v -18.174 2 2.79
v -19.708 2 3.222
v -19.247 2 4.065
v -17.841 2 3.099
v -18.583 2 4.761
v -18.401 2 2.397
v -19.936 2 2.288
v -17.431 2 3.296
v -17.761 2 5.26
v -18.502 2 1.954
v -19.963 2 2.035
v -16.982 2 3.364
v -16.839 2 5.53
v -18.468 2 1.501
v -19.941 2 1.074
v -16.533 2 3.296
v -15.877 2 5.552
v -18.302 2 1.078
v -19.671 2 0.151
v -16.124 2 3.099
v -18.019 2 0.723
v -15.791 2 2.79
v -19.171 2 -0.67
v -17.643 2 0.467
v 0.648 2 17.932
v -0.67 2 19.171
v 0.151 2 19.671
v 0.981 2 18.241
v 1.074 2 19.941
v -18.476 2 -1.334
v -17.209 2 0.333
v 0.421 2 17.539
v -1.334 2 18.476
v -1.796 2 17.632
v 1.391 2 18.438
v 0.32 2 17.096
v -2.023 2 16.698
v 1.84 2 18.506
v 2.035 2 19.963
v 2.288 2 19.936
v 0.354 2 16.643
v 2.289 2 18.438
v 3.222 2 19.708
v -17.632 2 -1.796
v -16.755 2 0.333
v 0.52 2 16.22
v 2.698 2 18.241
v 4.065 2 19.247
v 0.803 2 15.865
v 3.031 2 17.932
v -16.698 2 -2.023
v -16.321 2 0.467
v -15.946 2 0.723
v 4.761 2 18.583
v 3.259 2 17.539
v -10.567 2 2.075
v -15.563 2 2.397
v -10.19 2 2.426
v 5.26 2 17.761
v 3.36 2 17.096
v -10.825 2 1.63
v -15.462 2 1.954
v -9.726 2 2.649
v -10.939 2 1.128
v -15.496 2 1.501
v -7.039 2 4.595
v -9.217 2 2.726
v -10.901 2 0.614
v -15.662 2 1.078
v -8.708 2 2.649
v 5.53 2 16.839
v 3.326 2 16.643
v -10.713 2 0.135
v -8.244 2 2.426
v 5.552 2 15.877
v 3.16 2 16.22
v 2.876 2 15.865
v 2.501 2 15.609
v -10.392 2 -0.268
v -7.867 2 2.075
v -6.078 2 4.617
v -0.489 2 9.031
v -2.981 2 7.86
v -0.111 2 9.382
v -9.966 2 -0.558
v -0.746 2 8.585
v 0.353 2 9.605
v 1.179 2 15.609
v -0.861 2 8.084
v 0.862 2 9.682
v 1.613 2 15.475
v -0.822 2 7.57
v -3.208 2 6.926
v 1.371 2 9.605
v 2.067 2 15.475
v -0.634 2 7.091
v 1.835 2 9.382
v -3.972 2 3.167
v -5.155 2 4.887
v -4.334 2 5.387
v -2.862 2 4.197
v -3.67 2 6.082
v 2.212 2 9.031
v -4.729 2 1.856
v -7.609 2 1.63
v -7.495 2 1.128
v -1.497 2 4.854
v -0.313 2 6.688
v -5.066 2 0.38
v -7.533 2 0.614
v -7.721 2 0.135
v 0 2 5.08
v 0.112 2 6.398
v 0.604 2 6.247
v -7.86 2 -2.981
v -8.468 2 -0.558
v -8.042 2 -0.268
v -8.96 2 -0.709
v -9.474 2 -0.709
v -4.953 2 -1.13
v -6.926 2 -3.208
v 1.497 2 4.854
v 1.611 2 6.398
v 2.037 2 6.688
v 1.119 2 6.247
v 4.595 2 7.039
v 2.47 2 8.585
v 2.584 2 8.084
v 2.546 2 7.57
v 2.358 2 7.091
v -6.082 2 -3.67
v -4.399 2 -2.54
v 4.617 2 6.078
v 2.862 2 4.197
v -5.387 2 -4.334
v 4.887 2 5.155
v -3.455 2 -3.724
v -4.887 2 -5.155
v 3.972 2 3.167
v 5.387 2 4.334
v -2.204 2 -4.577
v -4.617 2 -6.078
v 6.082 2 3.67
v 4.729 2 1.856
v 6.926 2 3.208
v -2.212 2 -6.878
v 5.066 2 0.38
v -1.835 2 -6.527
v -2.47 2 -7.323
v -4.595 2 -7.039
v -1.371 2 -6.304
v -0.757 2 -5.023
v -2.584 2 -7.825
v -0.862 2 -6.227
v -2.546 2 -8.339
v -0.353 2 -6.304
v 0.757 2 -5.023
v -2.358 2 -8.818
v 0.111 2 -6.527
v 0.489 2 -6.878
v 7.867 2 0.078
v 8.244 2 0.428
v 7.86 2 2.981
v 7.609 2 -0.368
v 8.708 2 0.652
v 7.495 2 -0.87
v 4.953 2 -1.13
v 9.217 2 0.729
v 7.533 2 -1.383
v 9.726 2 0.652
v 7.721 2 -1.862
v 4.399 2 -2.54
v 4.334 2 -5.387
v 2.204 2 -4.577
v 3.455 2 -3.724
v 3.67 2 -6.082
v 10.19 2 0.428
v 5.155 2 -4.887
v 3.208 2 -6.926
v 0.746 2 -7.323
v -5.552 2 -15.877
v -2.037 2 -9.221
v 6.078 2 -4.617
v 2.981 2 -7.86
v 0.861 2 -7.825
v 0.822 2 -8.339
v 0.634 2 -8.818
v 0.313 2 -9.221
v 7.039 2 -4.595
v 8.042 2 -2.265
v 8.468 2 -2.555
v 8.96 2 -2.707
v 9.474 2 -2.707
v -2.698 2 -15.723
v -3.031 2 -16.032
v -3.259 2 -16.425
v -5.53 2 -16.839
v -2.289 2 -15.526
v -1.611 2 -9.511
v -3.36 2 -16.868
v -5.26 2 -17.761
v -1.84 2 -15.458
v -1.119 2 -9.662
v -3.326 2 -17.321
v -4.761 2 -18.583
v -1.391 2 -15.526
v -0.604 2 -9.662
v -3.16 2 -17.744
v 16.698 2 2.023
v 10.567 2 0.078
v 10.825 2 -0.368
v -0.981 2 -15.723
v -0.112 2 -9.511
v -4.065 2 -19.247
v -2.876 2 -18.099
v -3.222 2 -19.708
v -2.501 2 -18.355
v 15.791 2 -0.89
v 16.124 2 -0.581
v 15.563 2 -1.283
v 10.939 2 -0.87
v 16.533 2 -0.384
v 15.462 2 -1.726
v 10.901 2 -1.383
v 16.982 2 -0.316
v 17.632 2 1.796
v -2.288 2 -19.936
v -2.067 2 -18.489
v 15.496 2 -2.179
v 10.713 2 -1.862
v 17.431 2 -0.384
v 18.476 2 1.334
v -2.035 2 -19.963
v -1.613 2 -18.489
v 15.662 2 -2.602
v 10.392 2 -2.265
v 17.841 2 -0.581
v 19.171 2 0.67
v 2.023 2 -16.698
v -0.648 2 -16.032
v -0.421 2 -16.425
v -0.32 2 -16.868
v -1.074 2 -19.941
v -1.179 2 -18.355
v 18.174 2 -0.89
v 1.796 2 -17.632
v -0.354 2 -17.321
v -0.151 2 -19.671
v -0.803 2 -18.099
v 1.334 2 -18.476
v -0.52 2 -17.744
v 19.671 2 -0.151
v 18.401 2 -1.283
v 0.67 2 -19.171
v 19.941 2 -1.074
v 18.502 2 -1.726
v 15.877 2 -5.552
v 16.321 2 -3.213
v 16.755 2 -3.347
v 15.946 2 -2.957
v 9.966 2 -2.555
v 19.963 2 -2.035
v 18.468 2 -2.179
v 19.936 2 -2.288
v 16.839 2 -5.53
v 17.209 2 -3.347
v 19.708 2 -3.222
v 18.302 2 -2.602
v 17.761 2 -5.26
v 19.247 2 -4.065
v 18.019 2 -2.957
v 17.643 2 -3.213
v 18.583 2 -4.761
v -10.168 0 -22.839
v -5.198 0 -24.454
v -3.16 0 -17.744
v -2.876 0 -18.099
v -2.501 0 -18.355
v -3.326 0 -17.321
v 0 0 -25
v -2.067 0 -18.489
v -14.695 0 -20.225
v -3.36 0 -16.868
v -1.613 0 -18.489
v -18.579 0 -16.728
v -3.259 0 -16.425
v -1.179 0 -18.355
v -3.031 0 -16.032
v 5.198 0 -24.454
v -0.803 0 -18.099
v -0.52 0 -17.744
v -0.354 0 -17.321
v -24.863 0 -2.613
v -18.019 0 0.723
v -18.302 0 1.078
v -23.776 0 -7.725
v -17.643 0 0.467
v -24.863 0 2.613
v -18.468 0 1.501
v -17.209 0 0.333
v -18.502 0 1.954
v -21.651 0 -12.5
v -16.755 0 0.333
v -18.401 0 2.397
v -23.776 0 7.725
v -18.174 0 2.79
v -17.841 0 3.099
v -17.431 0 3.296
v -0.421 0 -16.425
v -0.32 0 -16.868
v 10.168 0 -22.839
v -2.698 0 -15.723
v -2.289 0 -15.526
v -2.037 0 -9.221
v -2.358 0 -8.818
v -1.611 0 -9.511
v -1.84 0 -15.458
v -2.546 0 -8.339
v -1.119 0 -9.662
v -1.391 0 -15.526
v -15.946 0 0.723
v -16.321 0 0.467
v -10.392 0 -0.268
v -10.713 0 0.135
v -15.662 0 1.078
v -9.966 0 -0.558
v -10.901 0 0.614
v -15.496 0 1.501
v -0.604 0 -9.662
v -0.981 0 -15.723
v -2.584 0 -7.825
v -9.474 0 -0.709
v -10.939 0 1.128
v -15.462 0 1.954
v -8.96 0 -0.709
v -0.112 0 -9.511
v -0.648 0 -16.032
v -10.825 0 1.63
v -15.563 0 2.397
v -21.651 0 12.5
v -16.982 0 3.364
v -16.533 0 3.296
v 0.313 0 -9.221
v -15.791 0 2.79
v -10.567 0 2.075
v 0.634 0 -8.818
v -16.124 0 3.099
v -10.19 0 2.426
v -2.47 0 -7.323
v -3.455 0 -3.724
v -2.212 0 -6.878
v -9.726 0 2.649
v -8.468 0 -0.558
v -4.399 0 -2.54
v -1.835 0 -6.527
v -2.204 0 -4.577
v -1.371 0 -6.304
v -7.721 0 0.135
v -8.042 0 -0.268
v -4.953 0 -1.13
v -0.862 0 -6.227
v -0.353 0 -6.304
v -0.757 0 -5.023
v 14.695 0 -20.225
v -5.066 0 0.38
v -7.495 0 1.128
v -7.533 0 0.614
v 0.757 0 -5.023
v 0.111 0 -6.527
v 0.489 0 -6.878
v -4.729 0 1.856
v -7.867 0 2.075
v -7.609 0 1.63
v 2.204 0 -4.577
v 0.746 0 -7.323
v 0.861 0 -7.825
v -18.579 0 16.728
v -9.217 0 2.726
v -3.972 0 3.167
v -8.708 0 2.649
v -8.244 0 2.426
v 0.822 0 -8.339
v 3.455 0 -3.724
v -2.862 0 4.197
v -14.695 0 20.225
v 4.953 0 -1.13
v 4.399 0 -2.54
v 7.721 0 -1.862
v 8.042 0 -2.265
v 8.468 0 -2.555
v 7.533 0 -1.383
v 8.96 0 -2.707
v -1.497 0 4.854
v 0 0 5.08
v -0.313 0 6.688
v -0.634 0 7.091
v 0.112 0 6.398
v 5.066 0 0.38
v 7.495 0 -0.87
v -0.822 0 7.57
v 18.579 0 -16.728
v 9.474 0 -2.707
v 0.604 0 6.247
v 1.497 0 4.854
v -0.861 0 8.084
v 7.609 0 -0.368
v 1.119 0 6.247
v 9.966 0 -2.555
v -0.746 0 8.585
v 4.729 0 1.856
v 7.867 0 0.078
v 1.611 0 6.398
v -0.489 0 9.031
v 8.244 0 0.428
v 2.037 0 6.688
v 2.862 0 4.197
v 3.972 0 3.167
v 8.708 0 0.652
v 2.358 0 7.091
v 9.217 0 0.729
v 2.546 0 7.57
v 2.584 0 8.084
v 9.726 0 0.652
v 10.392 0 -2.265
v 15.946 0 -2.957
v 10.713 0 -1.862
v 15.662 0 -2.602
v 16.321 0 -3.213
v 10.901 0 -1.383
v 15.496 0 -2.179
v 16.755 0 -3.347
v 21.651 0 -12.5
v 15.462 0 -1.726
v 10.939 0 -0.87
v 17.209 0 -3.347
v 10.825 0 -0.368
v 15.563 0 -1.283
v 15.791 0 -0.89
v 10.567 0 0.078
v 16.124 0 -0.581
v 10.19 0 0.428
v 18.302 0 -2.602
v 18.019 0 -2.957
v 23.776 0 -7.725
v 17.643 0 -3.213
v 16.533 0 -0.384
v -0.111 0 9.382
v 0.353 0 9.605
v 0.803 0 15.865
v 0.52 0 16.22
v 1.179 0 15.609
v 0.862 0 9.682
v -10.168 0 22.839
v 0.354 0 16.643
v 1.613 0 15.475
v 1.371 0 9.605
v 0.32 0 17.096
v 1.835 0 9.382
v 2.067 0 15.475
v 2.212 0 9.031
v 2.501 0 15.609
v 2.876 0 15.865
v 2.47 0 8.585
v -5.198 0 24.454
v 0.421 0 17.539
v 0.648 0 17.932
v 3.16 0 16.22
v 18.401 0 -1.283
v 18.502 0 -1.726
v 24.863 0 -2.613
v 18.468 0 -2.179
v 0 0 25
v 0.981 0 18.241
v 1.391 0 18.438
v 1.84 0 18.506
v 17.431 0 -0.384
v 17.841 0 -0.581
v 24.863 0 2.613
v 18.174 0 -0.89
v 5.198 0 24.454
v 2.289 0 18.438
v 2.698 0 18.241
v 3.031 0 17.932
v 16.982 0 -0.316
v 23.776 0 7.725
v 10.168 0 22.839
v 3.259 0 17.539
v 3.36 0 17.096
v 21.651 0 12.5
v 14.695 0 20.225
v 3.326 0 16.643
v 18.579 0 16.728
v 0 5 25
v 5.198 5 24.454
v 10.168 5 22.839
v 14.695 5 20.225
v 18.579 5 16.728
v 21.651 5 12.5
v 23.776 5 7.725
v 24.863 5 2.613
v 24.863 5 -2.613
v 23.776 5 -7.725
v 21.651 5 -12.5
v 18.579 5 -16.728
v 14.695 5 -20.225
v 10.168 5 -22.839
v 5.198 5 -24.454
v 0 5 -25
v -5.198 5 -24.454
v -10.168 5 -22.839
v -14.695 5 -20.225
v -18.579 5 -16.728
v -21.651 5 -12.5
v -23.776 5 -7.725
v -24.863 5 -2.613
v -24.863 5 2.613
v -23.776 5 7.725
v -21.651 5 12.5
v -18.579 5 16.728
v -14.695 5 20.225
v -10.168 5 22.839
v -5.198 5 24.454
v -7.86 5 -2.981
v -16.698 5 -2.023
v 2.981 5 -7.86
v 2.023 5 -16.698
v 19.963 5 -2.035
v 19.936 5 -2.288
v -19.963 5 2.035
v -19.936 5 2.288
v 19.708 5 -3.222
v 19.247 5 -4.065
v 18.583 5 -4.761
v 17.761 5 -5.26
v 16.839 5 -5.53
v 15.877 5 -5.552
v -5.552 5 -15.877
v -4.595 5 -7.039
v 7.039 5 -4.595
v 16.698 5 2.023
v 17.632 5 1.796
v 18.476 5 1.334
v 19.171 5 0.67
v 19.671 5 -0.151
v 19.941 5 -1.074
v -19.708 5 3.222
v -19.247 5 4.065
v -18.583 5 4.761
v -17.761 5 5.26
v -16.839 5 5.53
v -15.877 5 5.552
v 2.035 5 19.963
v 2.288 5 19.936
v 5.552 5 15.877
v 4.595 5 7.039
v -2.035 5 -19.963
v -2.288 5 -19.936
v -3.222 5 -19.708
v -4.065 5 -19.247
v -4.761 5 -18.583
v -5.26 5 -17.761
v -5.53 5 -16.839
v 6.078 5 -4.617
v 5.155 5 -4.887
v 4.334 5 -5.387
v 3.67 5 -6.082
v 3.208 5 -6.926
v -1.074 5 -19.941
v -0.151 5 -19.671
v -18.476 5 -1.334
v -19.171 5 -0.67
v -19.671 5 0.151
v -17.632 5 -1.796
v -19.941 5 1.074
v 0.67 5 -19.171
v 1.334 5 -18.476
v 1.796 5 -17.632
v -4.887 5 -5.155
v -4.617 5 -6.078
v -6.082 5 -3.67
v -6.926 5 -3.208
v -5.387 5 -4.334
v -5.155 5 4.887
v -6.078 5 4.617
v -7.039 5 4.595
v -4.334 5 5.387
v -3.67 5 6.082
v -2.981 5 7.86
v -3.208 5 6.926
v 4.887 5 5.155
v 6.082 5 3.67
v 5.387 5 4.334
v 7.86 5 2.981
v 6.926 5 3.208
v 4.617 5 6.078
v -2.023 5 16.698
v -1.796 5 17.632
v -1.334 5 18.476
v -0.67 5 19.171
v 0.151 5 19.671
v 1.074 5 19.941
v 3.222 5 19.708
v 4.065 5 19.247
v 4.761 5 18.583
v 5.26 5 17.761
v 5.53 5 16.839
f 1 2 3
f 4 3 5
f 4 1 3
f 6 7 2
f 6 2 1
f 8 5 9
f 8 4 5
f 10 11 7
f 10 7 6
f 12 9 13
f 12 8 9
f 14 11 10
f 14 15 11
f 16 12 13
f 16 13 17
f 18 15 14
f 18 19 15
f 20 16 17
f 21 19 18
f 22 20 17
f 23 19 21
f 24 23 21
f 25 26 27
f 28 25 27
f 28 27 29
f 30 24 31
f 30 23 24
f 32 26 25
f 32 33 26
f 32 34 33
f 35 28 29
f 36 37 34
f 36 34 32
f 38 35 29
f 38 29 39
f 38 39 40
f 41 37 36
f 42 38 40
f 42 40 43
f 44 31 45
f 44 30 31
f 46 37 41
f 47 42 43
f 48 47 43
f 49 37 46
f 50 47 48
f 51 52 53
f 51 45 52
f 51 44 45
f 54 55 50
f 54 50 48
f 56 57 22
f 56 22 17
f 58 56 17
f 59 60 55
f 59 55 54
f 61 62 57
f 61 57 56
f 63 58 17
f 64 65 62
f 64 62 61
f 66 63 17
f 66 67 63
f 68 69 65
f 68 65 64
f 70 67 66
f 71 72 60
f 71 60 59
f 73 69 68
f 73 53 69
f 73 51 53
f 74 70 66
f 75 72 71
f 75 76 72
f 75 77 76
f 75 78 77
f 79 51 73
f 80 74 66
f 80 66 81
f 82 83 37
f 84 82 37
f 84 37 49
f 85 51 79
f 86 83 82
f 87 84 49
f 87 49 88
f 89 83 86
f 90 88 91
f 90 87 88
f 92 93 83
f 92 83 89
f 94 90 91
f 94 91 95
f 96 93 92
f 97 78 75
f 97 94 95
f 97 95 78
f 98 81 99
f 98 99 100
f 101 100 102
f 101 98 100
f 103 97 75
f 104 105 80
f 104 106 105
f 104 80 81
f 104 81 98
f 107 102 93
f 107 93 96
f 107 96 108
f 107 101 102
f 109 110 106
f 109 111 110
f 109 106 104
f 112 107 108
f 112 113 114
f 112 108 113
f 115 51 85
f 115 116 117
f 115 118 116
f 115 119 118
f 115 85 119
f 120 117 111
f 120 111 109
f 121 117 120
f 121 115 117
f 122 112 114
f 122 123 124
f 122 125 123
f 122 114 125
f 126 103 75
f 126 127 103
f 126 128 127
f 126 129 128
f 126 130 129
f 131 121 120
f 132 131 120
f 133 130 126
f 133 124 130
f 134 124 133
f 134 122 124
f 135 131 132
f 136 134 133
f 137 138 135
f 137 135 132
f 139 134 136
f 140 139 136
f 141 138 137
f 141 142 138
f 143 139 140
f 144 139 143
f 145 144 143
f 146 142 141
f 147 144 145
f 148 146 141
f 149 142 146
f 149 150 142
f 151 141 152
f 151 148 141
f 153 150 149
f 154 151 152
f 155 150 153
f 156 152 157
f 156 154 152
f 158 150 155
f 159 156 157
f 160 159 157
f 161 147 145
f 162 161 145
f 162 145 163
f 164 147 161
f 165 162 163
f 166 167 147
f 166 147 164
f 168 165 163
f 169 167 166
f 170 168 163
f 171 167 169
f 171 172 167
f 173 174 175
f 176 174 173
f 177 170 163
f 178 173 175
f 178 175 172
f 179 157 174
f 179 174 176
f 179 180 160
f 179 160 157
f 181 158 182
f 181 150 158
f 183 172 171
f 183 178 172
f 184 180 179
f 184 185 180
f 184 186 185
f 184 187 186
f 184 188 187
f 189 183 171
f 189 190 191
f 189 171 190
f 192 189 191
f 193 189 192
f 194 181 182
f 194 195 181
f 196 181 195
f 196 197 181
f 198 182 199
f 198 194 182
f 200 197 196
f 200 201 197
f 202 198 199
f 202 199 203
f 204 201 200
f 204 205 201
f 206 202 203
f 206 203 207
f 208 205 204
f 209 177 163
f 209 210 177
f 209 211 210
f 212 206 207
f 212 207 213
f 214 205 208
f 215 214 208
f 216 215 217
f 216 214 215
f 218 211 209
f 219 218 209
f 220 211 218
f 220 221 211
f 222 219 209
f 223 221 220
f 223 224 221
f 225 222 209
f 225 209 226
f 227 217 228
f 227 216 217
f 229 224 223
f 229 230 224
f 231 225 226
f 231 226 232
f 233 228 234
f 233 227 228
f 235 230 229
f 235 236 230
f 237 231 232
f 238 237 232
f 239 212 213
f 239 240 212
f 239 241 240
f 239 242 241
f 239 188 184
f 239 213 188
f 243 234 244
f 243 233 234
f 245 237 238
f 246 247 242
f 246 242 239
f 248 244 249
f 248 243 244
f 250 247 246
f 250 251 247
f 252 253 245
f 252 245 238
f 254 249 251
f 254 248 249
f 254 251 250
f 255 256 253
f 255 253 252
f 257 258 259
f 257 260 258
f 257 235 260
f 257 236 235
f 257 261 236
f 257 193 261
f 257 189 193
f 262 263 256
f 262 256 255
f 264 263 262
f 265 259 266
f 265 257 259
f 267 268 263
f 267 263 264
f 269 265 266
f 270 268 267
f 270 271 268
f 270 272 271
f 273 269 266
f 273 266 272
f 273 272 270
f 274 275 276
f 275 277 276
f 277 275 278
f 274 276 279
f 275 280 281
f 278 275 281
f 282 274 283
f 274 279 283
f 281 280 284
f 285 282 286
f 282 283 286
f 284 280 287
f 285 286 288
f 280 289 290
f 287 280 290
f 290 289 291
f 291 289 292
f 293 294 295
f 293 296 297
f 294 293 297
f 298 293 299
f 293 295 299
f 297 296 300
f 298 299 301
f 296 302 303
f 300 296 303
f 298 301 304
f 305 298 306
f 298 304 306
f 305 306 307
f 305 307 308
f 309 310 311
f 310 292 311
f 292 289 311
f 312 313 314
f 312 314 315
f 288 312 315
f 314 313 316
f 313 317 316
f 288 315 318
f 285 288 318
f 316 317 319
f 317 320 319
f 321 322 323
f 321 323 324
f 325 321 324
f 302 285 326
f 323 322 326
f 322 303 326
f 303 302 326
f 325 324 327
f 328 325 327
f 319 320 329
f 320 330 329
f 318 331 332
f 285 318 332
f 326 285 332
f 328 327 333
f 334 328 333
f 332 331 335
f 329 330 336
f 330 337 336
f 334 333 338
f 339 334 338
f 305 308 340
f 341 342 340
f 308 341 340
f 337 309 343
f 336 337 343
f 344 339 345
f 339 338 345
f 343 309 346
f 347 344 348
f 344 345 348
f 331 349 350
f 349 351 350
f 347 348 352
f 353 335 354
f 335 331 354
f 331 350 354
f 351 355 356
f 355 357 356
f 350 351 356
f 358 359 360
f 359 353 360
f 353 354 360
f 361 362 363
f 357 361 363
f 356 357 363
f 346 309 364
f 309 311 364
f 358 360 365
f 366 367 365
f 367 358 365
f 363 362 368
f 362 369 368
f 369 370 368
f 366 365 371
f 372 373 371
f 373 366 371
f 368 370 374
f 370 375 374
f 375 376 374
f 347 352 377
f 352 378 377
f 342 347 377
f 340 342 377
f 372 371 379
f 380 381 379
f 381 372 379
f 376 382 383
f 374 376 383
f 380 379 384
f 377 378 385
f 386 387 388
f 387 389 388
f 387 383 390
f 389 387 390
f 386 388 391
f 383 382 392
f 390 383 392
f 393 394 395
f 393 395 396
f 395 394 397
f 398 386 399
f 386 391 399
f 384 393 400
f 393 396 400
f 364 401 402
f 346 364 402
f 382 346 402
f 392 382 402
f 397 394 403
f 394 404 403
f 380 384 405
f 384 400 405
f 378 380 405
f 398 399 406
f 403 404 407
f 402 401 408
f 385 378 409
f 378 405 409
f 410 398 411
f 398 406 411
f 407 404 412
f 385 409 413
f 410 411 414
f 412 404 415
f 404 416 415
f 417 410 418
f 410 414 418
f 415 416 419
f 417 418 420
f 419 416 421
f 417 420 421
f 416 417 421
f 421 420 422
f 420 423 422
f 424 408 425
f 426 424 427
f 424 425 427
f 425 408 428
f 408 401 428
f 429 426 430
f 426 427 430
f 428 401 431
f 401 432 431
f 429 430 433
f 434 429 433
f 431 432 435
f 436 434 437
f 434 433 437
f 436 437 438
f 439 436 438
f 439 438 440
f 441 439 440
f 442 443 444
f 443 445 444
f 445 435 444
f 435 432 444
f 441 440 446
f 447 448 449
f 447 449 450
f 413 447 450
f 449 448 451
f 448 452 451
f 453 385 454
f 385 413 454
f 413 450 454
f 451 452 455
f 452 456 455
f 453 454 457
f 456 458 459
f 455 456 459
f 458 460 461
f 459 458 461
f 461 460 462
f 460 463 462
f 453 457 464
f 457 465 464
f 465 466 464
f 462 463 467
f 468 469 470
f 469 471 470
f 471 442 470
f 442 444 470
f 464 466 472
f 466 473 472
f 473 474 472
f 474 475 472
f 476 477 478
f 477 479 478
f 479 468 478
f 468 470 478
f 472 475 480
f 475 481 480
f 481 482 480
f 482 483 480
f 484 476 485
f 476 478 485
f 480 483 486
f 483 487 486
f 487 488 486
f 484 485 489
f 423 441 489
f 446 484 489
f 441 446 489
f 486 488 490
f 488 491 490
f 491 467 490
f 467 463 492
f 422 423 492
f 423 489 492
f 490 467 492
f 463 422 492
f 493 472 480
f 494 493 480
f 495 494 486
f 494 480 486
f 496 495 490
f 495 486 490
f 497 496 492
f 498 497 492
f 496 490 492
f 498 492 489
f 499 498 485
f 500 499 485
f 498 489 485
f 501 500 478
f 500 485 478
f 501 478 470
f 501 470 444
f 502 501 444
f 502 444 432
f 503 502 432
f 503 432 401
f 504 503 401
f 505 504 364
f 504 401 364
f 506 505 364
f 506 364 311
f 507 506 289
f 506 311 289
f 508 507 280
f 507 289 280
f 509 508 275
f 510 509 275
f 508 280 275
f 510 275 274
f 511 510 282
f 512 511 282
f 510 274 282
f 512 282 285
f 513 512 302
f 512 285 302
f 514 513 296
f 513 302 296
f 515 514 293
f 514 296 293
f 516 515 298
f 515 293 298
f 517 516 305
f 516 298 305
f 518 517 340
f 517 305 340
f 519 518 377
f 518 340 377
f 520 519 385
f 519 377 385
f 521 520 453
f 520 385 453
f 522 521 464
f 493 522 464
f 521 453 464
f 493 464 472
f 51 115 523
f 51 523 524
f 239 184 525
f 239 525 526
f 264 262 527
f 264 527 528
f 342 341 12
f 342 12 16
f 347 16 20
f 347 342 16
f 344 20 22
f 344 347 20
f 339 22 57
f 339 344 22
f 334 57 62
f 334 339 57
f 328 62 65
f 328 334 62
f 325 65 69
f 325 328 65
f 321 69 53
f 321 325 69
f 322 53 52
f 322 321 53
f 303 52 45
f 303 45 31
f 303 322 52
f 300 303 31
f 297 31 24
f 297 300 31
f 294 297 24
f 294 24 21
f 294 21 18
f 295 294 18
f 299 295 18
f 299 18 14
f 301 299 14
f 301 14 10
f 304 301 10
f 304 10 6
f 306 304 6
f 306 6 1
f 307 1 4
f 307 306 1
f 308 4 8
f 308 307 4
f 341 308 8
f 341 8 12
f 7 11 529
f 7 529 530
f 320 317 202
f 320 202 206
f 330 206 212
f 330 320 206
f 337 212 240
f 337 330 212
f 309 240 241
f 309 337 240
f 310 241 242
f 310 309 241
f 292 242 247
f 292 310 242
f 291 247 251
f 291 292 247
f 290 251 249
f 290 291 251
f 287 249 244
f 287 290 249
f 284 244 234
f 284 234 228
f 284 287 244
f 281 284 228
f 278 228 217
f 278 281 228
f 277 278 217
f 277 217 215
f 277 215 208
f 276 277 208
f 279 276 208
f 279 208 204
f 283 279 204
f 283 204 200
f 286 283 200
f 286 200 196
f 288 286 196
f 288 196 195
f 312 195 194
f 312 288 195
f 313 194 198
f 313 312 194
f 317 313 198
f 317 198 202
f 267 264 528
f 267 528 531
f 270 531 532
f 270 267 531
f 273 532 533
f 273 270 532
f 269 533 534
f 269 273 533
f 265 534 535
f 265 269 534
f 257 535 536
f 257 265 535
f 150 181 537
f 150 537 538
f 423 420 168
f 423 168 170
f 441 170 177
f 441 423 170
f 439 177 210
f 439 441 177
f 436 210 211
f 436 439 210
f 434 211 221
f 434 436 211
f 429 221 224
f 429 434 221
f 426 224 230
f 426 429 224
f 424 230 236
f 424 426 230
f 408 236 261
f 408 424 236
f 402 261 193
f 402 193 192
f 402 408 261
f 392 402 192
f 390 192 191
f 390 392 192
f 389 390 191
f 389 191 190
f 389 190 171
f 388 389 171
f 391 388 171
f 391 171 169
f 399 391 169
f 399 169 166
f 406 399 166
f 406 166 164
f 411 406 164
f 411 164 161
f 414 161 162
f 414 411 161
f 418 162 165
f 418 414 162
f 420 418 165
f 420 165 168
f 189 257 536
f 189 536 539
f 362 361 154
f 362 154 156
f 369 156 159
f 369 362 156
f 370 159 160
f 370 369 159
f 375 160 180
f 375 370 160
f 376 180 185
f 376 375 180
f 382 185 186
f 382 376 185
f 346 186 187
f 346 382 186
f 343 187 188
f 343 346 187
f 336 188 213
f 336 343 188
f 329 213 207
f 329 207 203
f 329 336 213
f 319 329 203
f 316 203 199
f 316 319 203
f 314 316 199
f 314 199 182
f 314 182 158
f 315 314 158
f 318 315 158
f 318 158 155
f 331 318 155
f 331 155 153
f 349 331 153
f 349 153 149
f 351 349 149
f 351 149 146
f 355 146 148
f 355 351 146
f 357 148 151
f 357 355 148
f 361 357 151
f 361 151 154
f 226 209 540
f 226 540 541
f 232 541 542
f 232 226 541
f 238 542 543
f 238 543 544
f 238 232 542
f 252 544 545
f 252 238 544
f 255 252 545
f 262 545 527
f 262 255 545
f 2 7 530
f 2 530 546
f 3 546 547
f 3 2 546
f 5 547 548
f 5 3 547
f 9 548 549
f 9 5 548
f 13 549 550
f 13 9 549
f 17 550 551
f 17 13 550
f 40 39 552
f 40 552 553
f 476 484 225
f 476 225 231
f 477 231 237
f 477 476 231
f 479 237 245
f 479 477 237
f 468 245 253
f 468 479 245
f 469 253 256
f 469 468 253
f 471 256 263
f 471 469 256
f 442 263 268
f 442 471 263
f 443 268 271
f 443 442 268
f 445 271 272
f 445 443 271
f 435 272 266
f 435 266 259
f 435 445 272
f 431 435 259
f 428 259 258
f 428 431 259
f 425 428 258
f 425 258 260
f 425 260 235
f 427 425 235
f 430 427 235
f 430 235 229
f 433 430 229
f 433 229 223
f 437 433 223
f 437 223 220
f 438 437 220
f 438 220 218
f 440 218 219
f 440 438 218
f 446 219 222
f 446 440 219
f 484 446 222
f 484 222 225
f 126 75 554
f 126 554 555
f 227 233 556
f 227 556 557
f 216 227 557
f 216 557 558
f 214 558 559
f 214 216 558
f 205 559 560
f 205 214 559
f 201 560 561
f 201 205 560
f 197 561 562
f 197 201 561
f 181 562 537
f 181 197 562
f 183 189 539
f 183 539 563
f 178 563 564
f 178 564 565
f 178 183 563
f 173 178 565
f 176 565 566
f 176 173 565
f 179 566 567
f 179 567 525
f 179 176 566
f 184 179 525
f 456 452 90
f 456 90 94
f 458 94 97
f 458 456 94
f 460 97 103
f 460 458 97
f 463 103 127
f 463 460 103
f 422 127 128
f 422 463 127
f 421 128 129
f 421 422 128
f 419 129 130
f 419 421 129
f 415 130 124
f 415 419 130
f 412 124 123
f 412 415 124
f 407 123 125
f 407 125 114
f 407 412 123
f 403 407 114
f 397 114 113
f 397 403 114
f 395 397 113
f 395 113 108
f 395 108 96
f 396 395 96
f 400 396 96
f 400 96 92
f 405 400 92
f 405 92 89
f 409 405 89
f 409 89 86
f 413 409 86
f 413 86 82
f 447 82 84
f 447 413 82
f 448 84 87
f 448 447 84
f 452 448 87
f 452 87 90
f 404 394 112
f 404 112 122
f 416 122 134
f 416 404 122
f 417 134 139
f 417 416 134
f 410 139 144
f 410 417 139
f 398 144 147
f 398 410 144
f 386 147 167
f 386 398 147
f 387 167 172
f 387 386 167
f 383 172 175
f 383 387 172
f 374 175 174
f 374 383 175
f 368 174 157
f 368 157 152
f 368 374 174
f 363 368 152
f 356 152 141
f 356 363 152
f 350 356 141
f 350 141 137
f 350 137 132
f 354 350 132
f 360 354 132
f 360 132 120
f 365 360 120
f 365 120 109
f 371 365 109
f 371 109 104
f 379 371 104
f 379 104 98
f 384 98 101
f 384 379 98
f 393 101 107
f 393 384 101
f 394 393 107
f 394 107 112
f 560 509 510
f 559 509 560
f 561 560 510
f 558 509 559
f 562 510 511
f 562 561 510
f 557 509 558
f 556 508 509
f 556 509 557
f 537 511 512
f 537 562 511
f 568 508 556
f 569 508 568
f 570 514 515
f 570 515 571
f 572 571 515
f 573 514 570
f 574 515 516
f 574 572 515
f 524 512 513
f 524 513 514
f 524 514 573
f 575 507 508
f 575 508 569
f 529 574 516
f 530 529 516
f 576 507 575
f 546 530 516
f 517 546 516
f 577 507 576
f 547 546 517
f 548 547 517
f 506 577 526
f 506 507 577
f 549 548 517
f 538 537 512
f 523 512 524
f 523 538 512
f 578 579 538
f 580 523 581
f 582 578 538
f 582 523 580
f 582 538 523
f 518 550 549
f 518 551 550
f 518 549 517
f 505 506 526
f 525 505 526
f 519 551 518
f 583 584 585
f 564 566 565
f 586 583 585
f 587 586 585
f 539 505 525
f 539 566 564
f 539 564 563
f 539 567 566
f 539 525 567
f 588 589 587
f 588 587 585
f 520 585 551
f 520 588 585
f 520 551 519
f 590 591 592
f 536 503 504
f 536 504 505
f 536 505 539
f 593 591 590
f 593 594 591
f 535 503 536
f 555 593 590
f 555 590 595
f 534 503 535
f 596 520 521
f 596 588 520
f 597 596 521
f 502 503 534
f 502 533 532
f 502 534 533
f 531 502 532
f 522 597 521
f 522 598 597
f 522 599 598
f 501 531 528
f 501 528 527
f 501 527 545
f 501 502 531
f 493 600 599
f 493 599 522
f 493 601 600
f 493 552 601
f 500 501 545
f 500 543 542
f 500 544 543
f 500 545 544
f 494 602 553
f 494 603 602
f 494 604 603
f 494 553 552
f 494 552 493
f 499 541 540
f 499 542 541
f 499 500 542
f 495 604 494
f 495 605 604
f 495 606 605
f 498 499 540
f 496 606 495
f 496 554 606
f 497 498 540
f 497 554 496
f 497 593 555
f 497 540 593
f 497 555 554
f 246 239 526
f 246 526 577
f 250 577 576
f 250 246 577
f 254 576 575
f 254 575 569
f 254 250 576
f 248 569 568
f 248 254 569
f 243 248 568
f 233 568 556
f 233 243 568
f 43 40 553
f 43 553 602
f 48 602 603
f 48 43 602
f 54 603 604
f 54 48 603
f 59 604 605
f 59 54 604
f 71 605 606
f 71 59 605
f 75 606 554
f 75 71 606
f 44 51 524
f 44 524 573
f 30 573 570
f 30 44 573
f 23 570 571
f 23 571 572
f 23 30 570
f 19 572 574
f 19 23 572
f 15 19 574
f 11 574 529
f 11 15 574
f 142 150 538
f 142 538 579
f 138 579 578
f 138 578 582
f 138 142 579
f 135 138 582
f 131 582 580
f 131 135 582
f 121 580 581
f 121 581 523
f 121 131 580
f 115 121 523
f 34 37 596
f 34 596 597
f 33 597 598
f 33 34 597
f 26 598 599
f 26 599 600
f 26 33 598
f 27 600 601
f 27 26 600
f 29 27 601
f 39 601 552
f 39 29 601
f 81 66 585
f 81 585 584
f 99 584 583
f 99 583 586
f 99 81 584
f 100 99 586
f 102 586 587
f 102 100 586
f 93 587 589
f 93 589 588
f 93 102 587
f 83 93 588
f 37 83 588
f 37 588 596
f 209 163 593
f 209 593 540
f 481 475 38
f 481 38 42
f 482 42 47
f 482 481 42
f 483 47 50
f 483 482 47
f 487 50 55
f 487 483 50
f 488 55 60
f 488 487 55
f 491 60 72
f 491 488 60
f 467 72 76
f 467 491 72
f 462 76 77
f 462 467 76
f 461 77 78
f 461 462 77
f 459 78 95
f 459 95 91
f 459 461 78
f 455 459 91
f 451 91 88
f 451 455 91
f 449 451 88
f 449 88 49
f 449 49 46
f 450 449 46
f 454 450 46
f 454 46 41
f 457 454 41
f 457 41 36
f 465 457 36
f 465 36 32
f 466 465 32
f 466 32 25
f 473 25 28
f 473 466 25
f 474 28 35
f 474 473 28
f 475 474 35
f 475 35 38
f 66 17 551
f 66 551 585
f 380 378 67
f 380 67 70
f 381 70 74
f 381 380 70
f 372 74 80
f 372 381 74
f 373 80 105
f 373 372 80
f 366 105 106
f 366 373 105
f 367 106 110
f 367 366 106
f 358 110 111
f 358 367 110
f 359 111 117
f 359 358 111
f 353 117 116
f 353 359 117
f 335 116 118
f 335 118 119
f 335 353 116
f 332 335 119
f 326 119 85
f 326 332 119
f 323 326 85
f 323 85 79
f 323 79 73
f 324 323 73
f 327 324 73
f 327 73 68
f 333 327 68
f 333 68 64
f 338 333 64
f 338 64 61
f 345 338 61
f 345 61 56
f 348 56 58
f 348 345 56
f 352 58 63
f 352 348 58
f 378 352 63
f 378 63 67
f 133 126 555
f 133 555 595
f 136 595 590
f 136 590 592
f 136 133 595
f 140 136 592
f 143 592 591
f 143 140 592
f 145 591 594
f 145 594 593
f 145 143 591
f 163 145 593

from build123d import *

# Parameters (mm, degrees)
SKETCH_1_R      = 25
EXTRUDE_1_DEPTH = 5
SKETCH_3_R      = 22.5
SKETCH_3_R_2    = 1.524
SKETCH_3_R_3    = 1.7272
SKETCH_3_R_4    = 5.08
EXTRUDE_2_DEPTH = 2


with BuildPart() as part:
    # 草圖1 → 填料-伸長1 (new body)
    with BuildSketch(Plane(origin=(0, 0, 0), x_dir=(1, 0, 0), z_dir=(0, 1, 0))):
        with Locations(Location((0, 0, 0), (0, 0, 270))):
            Circle(SKETCH_1_R)
        with BuildLine():
            Line((-19.962936653, -2.035103236), (-19.935577611, -2.287625478))
            ThreePointArc((-19.935577611, -2.287625478), (-18.582614267, -4.760555699), (-15.877298983, -5.552491873))
            Line((-15.877298983, -5.552491873), (-7.039020507, -4.594925386))
            ThreePointArc((-7.039020507, -4.594925386), (-4.333705223, -5.38686156), (-2.980741879, -7.859791782))
            Line((-2.980741879, -7.859791782), (-2.023175392, -16.698070258))
            ThreePointArc((-2.023175392, -16.698070258), (-0.670212048, -19.171000479), (2.035103236, -19.962936653))
            Line((2.035103236, -19.962936653), (2.287625478, -19.935577611))
            ThreePointArc((2.287625478, -19.935577611), (4.760555699, -18.582614267), (5.552491873, -15.877298983))
            Line((5.552491873, -15.877298983), (4.594925386, -7.039020507))
            ThreePointArc((4.594925386, -7.039020507), (5.38686156, -4.333705223), (7.859791782, -2.980741879))
            Line((7.859791782, -2.980741879), (16.698070258, -2.023175392))
            ThreePointArc((16.698070258, -2.023175392), (19.171000479, -0.670212048), (19.962936653, 2.035103236))
            Line((19.962936653, 2.035103236), (19.935577611, 2.287625478))
            ThreePointArc((19.935577611, 2.287625478), (18.582614267, 4.760555699), (15.877298983, 5.552491873))
            Line((15.877298983, 5.552491873), (7.039020507, 4.594925386))
            ThreePointArc((7.039020507, 4.594925386), (4.333705223, 5.38686156), (2.980741879, 7.859791782))
            Line((2.980741879, 7.859791782), (2.023175392, 16.698070258))
            ThreePointArc((2.023175392, 16.698070258), (0.670212048, 19.171000479), (-2.035103236, 19.962936653))
            Line((-2.035103236, 19.962936653), (-2.287625478, 19.935577611))
            ThreePointArc((-2.287625478, 19.935577611), (-4.760555699, 18.582614267), (-5.552491873, 15.877298983))
            Line((-5.552491873, 15.877298983), (-4.594925386, 7.039020507))
            ThreePointArc((-4.594925386, 7.039020507), (-5.38686156, 4.333705223), (-7.859791782, 2.980741879))
            Line((-7.859791782, 2.980741879), (-16.698070258, 2.023175392))
            ThreePointArc((-16.698070258, 2.023175392), (-19.171000479, 0.670212048), (-19.962936653, -2.035103236))
        make_face(mode=Mode.SUBTRACT)
    extrude(amount=EXTRUDE_1_DEPTH)

    # 草圖3 → 填料-伸長2 (add)
    with BuildSketch(Plane(origin=(0, 0, 0), x_dir=(1, 0, 0), z_dir=(0, 1, 0))):
        Circle(SKETCH_3_R)
        with Locations(Location((16.982120786, 1.839895607, 0), (0, 0, 270))):
            Circle(SKETCH_3_R_2, mode=Mode.SUBTRACT)
        with Locations(Location((9.217061839, 0.998605051, 0), (0, 0, 270))):
            Circle(SKETCH_3_R_3, mode=Mode.SUBTRACT)
        with Locations(Location((1.839895607, -16.982120786, 0), (0, 0, 270))):
            Circle(SKETCH_3_R_2, mode=Mode.SUBTRACT)
        with Locations(Location((0.861809838, -7.954450629, 0), (0, 0, 270))):
            Circle(SKETCH_3_R_3, mode=Mode.SUBTRACT)
        with Locations(Location((0, 0, 0), (0, 0, 270))):
            Circle(SKETCH_3_R_4, mode=Mode.SUBTRACT)
        with Locations(Location((-16.982120786, -1.839895607, 0), (0, 0, 270))):
            Circle(SKETCH_3_R_2, mode=Mode.SUBTRACT)
        with Locations(Location((-9.217061839, -0.998605051, 0), (0, 0, 270))):
            Circle(SKETCH_3_R_3, mode=Mode.SUBTRACT)
        with Locations(Location((-1.839895607, 16.982120786, 0), (0, 0, 270))):
            Circle(SKETCH_3_R_2, mode=Mode.SUBTRACT)
        with Locations(Location((-0.861809838, 7.954450629, 0), (0, 0, 270))):
            Circle(SKETCH_3_R_3, mode=Mode.SUBTRACT)
    extrude(amount=EXTRUDE_2_DEPTH)


solid = part.part
